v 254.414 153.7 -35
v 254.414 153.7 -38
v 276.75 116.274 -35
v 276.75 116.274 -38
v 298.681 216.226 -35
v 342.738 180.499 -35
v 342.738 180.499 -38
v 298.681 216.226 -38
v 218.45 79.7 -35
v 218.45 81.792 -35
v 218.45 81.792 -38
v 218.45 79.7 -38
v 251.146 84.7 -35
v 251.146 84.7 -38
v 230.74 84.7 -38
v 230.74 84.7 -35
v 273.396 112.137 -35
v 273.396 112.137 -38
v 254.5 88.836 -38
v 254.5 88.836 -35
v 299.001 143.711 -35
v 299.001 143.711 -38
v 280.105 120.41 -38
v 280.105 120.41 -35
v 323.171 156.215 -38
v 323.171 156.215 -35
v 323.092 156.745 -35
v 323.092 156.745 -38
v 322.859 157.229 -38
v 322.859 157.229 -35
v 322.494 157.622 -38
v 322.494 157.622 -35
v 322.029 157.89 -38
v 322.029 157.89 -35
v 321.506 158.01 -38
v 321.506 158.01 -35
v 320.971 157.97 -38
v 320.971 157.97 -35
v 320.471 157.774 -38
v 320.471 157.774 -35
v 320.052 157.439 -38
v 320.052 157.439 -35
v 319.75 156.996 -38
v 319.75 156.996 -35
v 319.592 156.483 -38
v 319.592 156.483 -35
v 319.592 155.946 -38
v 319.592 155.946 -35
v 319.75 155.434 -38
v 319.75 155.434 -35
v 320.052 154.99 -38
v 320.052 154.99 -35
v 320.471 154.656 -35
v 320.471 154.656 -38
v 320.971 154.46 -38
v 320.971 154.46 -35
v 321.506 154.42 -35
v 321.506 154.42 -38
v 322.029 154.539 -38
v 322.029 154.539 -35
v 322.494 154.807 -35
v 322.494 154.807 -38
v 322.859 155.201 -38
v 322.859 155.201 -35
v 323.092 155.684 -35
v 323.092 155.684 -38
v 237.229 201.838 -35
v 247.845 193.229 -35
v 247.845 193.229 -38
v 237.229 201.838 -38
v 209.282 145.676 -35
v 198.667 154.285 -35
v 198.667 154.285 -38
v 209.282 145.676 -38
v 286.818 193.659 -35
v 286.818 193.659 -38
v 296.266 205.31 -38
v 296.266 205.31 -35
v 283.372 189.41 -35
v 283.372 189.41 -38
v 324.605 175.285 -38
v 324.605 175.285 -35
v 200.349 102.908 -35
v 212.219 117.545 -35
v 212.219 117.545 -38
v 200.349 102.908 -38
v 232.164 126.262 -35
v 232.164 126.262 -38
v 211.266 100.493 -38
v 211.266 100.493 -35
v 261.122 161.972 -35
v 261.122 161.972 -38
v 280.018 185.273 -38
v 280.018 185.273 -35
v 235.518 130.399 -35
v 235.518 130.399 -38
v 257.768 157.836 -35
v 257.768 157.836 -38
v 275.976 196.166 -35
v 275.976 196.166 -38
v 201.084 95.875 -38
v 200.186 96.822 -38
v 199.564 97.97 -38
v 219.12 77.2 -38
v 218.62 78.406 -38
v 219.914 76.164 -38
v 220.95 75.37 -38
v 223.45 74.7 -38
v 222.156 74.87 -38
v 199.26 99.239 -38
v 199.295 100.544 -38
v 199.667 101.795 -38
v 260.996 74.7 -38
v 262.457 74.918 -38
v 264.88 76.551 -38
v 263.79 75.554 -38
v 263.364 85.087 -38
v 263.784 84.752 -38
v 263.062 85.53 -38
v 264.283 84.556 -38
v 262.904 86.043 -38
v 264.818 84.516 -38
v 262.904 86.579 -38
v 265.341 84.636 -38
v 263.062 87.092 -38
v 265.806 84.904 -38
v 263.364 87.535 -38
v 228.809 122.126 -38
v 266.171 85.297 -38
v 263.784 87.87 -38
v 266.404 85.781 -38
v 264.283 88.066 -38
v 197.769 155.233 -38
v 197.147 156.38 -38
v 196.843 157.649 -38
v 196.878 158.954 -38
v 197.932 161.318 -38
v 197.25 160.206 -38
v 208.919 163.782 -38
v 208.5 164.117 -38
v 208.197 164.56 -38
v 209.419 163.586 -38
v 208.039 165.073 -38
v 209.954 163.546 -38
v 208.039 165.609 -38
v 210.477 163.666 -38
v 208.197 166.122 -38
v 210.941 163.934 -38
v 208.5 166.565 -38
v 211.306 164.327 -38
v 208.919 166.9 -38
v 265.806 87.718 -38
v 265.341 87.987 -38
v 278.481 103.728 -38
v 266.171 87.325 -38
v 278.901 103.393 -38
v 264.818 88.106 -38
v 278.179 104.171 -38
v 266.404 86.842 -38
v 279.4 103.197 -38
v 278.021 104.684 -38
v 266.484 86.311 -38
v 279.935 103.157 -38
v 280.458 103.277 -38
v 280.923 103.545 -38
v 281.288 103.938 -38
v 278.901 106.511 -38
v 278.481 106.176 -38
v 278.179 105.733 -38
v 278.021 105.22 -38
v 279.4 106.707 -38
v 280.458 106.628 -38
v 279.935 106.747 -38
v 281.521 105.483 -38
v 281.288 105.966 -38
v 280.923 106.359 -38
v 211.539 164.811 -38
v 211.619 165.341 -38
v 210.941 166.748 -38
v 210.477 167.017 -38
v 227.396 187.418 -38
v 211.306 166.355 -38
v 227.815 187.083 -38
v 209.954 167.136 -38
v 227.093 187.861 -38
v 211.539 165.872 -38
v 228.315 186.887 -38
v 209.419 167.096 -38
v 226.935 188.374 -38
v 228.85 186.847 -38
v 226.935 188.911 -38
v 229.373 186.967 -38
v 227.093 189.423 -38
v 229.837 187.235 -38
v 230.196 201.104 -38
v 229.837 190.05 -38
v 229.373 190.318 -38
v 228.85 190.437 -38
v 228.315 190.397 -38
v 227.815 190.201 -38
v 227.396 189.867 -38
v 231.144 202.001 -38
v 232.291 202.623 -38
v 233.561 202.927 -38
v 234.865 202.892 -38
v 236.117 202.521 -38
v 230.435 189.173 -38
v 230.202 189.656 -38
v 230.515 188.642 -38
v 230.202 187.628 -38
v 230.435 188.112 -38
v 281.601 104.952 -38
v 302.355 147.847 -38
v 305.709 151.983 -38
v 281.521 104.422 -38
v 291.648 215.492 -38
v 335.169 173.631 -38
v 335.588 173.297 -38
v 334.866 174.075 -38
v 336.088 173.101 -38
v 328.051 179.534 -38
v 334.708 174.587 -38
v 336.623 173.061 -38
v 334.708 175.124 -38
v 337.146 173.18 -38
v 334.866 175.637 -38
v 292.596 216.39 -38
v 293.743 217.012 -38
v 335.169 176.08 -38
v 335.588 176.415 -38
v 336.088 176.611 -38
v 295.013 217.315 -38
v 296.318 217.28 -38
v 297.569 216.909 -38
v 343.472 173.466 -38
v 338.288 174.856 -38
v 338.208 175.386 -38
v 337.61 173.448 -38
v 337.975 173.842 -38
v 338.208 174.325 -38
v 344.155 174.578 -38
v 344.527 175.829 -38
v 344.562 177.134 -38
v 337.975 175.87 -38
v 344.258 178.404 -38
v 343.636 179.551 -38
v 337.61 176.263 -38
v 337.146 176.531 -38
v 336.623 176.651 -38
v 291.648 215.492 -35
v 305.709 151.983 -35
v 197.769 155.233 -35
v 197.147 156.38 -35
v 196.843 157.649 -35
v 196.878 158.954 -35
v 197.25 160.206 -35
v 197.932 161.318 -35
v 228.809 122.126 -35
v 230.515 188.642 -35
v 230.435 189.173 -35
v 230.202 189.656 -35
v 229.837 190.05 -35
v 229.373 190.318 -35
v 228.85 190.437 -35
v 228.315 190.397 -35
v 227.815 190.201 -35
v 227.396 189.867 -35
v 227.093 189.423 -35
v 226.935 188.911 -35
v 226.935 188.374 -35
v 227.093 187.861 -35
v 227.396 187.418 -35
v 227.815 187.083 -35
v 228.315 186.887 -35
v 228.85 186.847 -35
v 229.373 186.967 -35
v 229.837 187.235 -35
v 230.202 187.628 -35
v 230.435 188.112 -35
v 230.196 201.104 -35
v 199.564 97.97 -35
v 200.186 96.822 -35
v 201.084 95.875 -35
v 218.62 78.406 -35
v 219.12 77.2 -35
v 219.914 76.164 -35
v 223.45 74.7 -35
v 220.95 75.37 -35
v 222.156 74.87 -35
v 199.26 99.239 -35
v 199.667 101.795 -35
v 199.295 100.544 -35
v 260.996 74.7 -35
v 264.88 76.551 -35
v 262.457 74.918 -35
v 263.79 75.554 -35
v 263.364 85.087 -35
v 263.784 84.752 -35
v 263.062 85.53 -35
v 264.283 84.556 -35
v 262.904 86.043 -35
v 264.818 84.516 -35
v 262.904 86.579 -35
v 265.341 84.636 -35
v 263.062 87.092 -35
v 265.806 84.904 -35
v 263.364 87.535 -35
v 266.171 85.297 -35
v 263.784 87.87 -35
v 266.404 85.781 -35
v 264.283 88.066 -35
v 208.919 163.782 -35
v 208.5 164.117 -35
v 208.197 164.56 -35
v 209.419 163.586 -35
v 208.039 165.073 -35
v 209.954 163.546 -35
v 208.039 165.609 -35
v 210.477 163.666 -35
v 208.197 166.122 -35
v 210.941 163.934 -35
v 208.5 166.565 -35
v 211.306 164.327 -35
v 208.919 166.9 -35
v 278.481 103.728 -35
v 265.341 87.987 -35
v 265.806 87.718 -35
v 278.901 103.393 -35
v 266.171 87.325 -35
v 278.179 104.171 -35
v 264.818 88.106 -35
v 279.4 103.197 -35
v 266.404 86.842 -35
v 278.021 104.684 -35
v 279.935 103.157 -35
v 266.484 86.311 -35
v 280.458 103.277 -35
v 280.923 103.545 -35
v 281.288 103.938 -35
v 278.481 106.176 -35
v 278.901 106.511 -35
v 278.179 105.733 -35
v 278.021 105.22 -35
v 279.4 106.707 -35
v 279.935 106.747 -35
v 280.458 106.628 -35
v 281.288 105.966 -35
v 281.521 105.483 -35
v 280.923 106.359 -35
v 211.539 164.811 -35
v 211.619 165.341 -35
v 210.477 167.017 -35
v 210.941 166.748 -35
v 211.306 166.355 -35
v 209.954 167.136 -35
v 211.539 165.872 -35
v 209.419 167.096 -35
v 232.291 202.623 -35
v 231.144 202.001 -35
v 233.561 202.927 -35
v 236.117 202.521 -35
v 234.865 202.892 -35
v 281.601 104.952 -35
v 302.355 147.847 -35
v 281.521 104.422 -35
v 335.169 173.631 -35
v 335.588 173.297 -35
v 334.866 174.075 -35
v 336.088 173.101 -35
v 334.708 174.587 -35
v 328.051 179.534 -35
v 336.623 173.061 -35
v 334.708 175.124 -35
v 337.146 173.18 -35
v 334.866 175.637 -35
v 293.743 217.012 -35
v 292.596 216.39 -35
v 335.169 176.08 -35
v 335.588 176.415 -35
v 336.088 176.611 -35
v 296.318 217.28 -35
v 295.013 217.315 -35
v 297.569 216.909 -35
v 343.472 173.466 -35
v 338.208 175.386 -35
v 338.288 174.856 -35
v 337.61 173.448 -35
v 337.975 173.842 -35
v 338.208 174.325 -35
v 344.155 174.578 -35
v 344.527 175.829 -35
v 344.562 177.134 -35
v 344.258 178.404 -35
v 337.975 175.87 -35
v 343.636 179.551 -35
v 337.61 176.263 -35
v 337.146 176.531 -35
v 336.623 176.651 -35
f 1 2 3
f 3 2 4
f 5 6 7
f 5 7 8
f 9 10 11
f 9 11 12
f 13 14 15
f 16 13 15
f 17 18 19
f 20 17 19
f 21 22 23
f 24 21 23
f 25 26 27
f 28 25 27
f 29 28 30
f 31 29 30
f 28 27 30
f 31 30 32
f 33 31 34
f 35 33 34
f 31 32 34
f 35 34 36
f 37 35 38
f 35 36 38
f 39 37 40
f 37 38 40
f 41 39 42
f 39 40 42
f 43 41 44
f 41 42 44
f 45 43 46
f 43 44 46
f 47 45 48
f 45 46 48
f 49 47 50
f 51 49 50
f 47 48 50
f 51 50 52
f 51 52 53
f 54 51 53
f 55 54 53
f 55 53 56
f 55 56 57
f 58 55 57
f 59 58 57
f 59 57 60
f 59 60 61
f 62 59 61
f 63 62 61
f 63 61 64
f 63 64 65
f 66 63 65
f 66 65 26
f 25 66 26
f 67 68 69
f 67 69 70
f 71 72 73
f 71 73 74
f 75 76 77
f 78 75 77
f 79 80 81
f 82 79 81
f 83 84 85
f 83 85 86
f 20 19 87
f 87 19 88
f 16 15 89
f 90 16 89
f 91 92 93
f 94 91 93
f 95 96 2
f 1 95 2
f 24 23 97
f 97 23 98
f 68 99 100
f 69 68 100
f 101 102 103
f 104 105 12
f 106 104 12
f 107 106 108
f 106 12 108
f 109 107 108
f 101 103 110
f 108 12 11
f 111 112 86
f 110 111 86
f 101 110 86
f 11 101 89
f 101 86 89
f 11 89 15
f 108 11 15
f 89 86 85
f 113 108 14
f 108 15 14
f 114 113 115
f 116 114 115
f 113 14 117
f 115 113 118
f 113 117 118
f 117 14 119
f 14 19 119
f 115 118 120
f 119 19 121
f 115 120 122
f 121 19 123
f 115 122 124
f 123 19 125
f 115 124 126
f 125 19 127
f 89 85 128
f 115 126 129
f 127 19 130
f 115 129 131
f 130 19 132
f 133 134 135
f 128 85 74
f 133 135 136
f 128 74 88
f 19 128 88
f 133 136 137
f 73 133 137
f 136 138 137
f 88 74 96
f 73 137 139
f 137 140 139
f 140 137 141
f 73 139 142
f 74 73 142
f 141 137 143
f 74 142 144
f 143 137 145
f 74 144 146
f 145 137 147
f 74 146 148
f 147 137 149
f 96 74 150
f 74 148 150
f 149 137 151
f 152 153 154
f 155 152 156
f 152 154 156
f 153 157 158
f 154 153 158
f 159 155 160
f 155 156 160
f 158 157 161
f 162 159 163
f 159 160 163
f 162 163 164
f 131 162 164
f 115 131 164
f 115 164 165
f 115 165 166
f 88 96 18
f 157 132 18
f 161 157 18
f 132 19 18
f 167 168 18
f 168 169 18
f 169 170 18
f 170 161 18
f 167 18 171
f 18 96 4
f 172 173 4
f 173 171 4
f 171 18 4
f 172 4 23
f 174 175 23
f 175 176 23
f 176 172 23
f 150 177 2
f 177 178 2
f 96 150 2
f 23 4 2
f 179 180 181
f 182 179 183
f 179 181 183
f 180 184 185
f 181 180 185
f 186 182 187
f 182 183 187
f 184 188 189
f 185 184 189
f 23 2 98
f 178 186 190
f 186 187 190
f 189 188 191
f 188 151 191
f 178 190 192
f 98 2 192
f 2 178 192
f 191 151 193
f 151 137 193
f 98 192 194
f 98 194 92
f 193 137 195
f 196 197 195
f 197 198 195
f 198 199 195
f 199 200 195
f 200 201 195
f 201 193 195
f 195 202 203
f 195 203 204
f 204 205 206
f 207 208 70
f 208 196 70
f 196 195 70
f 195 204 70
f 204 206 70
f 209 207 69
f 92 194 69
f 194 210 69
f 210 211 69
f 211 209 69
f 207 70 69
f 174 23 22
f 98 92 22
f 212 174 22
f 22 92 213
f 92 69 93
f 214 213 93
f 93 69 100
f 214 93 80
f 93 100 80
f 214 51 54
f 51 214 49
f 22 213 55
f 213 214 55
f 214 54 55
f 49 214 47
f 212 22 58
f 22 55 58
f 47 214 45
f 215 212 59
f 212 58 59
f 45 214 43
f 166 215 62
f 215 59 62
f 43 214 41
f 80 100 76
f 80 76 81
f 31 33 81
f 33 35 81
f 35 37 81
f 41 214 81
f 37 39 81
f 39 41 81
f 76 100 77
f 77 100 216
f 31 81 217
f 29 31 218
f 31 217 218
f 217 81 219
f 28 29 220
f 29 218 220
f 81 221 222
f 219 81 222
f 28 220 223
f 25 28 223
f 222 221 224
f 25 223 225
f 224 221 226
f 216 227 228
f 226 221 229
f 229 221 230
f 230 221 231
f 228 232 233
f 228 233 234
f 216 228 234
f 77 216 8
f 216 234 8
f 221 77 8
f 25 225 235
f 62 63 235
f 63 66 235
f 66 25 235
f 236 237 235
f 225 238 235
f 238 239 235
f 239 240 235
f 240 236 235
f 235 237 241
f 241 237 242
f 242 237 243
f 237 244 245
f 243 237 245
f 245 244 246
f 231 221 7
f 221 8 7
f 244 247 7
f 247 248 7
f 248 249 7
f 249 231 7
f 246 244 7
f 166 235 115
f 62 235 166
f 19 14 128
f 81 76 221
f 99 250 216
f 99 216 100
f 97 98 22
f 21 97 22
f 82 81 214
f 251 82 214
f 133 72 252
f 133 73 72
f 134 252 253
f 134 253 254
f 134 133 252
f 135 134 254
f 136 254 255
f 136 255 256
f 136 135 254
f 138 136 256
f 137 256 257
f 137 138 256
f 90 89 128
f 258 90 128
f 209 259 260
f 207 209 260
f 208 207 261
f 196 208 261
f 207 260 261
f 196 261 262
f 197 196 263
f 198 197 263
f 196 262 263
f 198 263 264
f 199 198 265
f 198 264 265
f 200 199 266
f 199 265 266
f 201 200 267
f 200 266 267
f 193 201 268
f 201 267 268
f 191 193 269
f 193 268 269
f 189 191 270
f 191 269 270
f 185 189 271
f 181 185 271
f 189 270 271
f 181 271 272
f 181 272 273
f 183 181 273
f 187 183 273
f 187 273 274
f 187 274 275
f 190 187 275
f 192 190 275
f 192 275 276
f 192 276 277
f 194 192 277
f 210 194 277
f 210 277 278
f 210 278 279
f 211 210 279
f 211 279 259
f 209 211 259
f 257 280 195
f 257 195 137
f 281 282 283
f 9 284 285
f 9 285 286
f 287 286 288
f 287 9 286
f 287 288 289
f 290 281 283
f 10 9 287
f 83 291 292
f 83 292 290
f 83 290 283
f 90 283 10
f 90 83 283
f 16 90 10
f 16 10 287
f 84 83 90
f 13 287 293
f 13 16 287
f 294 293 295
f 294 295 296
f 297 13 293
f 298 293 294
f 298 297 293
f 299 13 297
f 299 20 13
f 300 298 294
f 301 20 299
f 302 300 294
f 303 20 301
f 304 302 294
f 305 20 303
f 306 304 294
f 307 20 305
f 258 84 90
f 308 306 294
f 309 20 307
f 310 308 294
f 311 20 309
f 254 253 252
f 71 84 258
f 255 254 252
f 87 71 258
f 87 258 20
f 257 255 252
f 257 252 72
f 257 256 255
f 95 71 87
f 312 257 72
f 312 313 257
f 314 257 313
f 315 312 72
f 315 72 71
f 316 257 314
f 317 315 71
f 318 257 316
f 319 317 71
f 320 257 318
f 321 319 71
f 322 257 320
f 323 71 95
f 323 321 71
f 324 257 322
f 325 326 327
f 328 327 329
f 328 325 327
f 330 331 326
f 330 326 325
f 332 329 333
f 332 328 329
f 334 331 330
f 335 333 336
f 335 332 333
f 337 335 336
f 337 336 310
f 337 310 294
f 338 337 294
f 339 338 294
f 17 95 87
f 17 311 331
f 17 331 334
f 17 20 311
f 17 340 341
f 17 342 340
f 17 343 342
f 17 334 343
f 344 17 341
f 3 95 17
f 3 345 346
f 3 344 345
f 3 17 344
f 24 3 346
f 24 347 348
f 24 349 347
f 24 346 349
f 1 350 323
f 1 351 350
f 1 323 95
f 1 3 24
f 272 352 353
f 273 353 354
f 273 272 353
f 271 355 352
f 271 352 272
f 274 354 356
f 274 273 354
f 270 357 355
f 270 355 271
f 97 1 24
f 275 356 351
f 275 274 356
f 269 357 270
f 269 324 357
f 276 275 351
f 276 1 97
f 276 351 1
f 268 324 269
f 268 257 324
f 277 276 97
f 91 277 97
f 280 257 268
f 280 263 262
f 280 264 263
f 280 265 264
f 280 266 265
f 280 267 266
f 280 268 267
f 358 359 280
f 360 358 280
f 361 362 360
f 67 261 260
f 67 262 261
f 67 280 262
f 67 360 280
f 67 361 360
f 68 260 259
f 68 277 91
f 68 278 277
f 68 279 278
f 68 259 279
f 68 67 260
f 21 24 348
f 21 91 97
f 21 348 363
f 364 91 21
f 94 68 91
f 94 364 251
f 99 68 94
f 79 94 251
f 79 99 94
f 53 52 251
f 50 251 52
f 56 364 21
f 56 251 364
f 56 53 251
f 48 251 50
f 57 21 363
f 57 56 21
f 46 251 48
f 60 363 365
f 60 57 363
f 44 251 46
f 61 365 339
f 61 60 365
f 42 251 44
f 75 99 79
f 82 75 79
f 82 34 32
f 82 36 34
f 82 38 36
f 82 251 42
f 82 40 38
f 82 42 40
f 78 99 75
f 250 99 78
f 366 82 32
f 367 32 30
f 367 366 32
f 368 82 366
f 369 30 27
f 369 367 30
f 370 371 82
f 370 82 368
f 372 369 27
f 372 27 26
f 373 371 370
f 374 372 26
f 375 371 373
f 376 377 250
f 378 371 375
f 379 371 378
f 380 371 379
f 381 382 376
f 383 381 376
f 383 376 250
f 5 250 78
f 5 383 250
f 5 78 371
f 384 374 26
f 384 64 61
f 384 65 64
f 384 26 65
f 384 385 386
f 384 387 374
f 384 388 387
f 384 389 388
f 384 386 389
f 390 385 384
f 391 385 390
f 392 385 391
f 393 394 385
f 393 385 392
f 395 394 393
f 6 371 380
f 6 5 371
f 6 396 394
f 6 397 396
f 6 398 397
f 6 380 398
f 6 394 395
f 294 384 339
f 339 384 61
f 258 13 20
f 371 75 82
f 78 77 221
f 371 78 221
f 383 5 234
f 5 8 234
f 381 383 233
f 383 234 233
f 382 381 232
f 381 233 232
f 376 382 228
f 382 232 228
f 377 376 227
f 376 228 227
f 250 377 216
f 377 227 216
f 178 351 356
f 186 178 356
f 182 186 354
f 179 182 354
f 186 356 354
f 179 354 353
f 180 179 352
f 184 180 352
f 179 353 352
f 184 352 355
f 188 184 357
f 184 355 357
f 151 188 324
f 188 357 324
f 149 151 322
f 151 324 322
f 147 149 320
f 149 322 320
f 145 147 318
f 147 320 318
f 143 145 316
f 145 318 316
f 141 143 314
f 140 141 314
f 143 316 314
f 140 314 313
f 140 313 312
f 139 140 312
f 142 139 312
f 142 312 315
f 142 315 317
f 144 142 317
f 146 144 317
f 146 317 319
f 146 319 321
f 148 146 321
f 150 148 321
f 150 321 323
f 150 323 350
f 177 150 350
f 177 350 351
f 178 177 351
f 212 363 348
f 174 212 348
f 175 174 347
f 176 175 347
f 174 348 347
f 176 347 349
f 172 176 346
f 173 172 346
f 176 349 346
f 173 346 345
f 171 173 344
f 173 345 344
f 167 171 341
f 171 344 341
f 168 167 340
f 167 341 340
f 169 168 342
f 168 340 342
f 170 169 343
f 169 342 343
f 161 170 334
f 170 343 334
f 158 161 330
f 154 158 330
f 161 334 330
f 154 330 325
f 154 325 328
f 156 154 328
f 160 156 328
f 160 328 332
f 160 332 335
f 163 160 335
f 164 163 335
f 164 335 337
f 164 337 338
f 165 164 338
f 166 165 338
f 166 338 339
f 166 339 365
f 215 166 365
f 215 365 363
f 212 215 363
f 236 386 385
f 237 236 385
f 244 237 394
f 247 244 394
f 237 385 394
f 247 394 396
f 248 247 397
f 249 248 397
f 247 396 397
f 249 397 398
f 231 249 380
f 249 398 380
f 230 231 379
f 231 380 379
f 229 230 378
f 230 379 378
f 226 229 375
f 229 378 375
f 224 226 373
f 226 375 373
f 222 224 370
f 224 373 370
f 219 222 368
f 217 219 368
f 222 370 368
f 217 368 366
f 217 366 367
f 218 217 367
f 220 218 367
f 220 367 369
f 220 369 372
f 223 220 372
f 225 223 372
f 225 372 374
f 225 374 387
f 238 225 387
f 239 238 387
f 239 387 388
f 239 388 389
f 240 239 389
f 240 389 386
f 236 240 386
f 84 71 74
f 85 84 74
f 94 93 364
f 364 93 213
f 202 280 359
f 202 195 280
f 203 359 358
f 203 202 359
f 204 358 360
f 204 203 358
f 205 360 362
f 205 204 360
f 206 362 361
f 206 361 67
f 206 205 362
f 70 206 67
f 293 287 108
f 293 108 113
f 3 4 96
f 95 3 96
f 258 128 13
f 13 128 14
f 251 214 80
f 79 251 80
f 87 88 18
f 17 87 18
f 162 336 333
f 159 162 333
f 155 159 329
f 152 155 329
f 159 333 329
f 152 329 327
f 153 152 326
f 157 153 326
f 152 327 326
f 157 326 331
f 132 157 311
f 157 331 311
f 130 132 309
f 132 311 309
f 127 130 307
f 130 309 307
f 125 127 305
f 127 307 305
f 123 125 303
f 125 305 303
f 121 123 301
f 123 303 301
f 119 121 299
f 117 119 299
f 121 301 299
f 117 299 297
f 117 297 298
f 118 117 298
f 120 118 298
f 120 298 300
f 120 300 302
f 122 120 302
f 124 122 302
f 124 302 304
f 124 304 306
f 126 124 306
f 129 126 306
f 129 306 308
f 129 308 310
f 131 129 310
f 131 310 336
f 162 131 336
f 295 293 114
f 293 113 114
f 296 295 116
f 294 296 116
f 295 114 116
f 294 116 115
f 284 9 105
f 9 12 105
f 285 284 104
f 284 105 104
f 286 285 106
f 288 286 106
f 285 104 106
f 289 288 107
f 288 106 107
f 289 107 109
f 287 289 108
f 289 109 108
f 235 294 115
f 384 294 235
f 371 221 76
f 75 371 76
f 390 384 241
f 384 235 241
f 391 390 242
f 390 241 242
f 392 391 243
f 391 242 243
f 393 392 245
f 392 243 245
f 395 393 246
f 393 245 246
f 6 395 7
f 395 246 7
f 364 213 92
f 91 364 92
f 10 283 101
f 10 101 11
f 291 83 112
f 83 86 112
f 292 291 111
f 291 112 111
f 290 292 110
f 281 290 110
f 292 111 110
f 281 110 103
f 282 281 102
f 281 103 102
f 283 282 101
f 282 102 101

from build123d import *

# Parameters (mm, degrees)
BOSS_EXTRUDE1_START  = -0.50441
BOSS_EXTRUDE1_DEPTH  = 3
M3_CLEARANCE_HOLE1_D = 3.6
CHAMFER1_SIZE        = 20
CUT_EXTRUDE1_DEPTH   = 9
FILLET1_R            = 5
M3_CLEARANCE_HOLE2_D = 3.6


with BuildPart() as part:
    # Sketch3 → Boss-Extrude1 (new body)
    with BuildSketch(Plane(origin=(0, 0, -35.504410209), x_dir=(-1, 0, 0), z_dir=(0, 0, -1)).offset(BOSS_EXTRUDE1_START)):
        Polygon((-218.449999836, 74.7), (-263.37903282, 74.7), (-346.621494542, 177.349268983), (-294.797705634, 219.375284435), (-263.37903282, 180.63179067), (-233.345595882, 204.98712461), (-194.783185306, 157.434431261), (-224.816622244, 133.079097321), (-197.200065818, 99.024129816), (-218.449999836, 81.791695172), align=None)
    extrude(amount=BOSS_EXTRUDE1_DEPTH)

    # M3 Clearance Hole1 (through all)
    with Locations(Plane(origin=(0, 0, -38), x_dir=(-1, 0, 0), z_dir=(0, 0, -1))):
        with Locations((-264.683828169, 86.311168448), (-279.800535078, 104.952122614), (-321.371479078, 156.214746571), (-336.488185987, 174.855700737)):
            Hole(M3_CLEARANCE_HOLE1_D / 2)

    # Chamfer1
    chamfer1_edges = [part.edges().sort_by_distance(p)[0] for p in [
        (224.816622244, 133.079097321, -36.500000209),
        (263.37903282, 180.63179067, -36.500000209),
    ]]
    chamfer(chamfer1_edges, length=CHAMFER1_SIZE)

    # Sketch11 → Cut-Extrude1 (cut)
    with BuildSketch(Plane(origin=(0, 0, -38), x_dir=(-1, 0, 0), z_dir=(0, 0, -1))):
        Polygon((-211.265757933, 100.492566173), (-228.809311315, 122.126151879), (-251.146132676, 84.7), (-230.74013843, 84.7), align=None)
        Polygon((-254.500346294, 88.836201271), (-232.163524933, 126.26235315), (-273.396229931, 112.137393978), align=None)
        Polygon((-235.517738552, 130.39855442), (-254.413622188, 153.699747128), (-276.750443549, 116.273595249), align=None)
        Polygon((-280.104657167, 120.40979652), (-257.767835806, 157.835948399), (-299.000540804, 143.710989227), align=None)
        Polygon((-261.122049425, 161.972149669), (-280.017933061, 185.273342377), (-302.354754422, 147.847190498), align=None)
        Polygon((-305.708968041, 151.983391768), (-283.372146679, 189.409543648), (-324.604851677, 175.284584476), align=None)
        Polygon((-286.818200173, 193.658995967), (-296.266141991, 205.309592321), (-328.050905171, 179.534036795), align=None)
    extrude(amount=-CUT_EXTRUDE1_DEPTH, mode=Mode.SUBTRACT)

    # Fillet1
    fillet1_edges = [part.edges().sort_by_distance(p)[0] for p in [
        (218.449999836, 74.7, -36.500000209),
        (197.200065818, 99.024129816, -36.500000209),
        (194.783185306, 157.434431261, -36.500000209),
        (233.345595882, 204.98712461, -36.500000209),
        (294.797705634, 219.375284435, -36.500000209),
        (346.621494542, 177.349268983, -36.500000209),
        (263.37903282, 74.7, -36.500000209),
    ]]
    fillet(fillet1_edges, radius=FILLET1_R)

    # M3 Clearance Hole2 (through all)
    with Locations(Plane(origin=(0, 0, -38), x_dir=(-1, 0, 0), z_dir=(0, 0, -1))):
        with Locations((-209.81921101, 165.341079734), (-228.715065901, 188.642236994)):
            Hole(M3_CLEARANCE_HOLE2_D / 2)


solid = part.part
